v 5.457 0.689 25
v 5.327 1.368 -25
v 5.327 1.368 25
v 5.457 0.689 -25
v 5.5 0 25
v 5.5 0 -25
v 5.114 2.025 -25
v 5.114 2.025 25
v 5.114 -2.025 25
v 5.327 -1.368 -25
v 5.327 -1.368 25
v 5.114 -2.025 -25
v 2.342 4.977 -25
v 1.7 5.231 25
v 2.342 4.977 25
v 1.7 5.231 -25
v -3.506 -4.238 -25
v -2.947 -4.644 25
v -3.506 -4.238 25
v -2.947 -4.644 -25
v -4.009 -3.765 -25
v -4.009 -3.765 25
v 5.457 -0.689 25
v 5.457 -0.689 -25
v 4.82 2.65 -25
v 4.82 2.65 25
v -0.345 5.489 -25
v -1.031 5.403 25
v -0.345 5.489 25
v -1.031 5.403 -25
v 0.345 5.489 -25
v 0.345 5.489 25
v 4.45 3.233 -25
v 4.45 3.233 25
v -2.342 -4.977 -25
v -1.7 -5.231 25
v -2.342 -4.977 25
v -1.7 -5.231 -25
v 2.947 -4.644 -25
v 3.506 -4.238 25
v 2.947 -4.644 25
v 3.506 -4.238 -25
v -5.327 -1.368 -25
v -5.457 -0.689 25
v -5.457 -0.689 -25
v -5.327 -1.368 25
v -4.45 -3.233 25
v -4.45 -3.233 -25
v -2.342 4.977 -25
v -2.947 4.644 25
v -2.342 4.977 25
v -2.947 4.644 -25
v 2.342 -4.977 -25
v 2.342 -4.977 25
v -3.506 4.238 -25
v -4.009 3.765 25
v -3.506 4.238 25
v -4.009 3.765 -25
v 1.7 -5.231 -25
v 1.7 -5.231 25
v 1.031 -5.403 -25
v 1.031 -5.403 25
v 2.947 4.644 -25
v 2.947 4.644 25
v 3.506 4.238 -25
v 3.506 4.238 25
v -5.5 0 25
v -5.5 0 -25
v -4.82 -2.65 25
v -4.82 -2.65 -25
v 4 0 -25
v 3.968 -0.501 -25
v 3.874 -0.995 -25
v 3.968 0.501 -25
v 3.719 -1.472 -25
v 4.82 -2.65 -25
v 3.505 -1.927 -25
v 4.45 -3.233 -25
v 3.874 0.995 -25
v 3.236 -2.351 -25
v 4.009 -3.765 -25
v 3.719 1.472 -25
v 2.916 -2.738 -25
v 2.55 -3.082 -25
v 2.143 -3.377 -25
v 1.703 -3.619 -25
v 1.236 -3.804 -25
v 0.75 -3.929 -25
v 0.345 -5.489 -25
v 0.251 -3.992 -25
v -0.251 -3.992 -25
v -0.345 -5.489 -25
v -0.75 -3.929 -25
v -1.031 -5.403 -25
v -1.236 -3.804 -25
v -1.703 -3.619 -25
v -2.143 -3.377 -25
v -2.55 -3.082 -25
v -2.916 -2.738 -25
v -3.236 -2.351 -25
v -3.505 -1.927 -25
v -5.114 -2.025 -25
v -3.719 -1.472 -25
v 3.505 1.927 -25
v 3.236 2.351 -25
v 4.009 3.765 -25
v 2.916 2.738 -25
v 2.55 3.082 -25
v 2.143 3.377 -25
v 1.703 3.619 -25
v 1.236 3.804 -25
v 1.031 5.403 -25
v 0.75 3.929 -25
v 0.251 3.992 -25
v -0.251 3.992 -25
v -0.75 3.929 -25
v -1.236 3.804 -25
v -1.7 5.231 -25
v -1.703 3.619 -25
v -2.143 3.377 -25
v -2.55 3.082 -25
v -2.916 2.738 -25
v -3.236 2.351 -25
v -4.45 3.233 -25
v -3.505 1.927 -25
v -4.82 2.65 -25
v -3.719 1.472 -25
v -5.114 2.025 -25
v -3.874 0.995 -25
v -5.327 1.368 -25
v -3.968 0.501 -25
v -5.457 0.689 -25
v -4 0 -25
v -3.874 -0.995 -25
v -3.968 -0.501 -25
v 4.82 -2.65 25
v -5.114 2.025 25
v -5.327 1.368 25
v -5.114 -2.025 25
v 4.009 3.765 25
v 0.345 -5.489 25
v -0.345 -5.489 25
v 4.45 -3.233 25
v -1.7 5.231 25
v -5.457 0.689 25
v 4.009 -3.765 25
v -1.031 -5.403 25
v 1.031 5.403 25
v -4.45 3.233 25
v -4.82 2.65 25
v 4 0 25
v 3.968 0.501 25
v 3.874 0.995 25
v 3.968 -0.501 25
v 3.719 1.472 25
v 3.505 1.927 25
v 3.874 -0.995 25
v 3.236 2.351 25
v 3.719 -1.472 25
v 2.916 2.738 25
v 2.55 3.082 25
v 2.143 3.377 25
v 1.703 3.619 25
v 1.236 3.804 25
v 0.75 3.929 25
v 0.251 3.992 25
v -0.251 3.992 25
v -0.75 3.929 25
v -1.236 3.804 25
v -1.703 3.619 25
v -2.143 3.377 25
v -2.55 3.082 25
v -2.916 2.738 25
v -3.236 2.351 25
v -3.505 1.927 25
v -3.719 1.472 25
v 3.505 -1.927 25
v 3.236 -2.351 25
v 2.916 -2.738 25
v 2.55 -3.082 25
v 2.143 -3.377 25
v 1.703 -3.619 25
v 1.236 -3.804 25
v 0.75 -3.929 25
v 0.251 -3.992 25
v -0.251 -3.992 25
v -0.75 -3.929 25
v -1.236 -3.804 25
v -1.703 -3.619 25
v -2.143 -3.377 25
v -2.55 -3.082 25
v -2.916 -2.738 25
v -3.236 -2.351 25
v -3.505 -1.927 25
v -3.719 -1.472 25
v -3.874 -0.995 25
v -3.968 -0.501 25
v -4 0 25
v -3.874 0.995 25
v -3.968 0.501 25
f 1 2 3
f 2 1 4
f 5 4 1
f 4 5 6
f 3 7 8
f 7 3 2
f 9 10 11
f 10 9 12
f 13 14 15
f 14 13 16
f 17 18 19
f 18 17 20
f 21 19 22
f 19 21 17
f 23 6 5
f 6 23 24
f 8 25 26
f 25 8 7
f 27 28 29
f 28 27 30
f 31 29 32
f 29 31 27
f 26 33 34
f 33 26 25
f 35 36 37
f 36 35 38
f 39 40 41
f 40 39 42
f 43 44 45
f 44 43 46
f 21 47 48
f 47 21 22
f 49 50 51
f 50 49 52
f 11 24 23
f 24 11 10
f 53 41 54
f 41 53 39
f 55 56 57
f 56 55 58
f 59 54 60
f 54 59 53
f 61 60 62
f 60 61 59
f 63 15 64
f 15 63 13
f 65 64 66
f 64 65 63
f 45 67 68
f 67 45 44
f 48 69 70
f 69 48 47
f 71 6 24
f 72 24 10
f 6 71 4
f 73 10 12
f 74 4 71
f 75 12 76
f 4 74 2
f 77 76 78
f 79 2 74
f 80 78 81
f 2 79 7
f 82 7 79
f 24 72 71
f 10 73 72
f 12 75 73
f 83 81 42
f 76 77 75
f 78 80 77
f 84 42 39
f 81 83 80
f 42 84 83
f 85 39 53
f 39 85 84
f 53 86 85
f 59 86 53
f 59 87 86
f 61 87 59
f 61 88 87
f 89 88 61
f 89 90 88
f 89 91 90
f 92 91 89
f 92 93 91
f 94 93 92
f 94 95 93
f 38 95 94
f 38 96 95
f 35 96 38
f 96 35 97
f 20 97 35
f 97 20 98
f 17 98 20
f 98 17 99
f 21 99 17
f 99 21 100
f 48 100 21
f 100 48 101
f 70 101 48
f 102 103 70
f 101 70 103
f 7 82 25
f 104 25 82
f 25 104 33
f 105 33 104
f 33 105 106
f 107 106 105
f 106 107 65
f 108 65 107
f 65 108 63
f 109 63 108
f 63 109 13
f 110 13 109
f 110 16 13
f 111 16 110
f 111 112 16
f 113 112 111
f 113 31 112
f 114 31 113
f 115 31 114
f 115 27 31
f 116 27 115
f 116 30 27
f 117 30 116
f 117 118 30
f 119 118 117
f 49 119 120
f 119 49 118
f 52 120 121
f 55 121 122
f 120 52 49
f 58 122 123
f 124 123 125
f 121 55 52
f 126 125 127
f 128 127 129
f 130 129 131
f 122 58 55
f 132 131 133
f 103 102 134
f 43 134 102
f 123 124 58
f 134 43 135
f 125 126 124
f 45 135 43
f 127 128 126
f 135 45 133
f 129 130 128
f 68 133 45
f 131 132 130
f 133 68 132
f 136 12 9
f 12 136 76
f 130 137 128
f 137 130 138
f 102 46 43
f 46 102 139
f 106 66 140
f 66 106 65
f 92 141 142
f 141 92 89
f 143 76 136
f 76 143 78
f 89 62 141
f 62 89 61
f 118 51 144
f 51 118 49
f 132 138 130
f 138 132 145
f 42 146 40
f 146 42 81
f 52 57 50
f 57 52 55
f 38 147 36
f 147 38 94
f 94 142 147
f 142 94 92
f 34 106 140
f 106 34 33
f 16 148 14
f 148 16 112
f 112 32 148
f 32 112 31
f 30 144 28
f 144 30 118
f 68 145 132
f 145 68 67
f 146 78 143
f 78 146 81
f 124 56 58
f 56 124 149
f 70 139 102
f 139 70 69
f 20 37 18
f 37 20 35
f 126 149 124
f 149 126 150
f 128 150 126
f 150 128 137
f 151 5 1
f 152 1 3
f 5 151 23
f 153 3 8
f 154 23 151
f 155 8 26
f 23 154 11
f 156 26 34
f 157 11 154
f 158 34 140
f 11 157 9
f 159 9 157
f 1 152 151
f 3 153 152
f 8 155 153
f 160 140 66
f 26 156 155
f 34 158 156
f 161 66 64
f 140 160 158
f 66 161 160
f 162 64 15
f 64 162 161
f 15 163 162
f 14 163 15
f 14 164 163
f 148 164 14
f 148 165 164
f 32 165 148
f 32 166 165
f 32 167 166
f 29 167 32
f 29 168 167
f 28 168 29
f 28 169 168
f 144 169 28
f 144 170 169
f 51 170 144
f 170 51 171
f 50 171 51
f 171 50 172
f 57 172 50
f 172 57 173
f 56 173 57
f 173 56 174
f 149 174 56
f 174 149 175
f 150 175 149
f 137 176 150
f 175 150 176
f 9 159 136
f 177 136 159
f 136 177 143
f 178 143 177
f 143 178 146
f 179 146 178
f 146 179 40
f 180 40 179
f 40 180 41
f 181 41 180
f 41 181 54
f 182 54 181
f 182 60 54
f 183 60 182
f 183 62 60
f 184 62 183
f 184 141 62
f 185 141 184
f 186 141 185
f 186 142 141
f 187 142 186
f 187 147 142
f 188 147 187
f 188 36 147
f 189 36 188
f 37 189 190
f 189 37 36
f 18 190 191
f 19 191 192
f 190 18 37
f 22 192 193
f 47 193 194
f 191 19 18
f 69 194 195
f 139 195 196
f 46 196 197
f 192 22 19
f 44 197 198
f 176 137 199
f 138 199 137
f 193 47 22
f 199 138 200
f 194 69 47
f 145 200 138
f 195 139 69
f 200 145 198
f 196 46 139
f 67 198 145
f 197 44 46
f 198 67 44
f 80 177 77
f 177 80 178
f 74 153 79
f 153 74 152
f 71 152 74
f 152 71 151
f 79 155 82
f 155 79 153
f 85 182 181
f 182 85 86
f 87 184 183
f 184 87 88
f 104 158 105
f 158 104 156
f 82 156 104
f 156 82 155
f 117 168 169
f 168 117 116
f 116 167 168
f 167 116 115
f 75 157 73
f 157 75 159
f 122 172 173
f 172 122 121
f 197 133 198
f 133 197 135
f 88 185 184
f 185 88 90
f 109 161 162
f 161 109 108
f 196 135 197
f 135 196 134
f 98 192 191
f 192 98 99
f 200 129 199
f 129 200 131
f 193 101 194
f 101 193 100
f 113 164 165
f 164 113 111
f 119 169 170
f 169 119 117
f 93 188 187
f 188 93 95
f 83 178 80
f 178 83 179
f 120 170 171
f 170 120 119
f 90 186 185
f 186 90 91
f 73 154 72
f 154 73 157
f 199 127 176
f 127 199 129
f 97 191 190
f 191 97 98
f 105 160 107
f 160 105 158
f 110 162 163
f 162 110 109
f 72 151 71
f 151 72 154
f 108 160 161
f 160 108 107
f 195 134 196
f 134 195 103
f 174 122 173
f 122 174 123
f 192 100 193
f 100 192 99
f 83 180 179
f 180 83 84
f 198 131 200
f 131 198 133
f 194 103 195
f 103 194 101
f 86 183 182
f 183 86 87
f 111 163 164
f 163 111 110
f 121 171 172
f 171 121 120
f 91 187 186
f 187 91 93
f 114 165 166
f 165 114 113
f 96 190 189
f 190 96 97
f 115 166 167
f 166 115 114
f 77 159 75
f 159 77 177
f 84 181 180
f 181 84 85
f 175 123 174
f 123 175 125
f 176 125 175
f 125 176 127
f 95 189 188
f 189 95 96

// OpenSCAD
$fn = 50;


difference() {
	union() {
		translate(v = [0, 0, -25.0000000000]) {
			cylinder(h = 50, r = 5.5000000000);
		}
	}
	union() {
		translate(v = [0, 0, -100.0000000000]) {
			cylinder(h = 200, r = 4.0000000000);
		}
	}
}
